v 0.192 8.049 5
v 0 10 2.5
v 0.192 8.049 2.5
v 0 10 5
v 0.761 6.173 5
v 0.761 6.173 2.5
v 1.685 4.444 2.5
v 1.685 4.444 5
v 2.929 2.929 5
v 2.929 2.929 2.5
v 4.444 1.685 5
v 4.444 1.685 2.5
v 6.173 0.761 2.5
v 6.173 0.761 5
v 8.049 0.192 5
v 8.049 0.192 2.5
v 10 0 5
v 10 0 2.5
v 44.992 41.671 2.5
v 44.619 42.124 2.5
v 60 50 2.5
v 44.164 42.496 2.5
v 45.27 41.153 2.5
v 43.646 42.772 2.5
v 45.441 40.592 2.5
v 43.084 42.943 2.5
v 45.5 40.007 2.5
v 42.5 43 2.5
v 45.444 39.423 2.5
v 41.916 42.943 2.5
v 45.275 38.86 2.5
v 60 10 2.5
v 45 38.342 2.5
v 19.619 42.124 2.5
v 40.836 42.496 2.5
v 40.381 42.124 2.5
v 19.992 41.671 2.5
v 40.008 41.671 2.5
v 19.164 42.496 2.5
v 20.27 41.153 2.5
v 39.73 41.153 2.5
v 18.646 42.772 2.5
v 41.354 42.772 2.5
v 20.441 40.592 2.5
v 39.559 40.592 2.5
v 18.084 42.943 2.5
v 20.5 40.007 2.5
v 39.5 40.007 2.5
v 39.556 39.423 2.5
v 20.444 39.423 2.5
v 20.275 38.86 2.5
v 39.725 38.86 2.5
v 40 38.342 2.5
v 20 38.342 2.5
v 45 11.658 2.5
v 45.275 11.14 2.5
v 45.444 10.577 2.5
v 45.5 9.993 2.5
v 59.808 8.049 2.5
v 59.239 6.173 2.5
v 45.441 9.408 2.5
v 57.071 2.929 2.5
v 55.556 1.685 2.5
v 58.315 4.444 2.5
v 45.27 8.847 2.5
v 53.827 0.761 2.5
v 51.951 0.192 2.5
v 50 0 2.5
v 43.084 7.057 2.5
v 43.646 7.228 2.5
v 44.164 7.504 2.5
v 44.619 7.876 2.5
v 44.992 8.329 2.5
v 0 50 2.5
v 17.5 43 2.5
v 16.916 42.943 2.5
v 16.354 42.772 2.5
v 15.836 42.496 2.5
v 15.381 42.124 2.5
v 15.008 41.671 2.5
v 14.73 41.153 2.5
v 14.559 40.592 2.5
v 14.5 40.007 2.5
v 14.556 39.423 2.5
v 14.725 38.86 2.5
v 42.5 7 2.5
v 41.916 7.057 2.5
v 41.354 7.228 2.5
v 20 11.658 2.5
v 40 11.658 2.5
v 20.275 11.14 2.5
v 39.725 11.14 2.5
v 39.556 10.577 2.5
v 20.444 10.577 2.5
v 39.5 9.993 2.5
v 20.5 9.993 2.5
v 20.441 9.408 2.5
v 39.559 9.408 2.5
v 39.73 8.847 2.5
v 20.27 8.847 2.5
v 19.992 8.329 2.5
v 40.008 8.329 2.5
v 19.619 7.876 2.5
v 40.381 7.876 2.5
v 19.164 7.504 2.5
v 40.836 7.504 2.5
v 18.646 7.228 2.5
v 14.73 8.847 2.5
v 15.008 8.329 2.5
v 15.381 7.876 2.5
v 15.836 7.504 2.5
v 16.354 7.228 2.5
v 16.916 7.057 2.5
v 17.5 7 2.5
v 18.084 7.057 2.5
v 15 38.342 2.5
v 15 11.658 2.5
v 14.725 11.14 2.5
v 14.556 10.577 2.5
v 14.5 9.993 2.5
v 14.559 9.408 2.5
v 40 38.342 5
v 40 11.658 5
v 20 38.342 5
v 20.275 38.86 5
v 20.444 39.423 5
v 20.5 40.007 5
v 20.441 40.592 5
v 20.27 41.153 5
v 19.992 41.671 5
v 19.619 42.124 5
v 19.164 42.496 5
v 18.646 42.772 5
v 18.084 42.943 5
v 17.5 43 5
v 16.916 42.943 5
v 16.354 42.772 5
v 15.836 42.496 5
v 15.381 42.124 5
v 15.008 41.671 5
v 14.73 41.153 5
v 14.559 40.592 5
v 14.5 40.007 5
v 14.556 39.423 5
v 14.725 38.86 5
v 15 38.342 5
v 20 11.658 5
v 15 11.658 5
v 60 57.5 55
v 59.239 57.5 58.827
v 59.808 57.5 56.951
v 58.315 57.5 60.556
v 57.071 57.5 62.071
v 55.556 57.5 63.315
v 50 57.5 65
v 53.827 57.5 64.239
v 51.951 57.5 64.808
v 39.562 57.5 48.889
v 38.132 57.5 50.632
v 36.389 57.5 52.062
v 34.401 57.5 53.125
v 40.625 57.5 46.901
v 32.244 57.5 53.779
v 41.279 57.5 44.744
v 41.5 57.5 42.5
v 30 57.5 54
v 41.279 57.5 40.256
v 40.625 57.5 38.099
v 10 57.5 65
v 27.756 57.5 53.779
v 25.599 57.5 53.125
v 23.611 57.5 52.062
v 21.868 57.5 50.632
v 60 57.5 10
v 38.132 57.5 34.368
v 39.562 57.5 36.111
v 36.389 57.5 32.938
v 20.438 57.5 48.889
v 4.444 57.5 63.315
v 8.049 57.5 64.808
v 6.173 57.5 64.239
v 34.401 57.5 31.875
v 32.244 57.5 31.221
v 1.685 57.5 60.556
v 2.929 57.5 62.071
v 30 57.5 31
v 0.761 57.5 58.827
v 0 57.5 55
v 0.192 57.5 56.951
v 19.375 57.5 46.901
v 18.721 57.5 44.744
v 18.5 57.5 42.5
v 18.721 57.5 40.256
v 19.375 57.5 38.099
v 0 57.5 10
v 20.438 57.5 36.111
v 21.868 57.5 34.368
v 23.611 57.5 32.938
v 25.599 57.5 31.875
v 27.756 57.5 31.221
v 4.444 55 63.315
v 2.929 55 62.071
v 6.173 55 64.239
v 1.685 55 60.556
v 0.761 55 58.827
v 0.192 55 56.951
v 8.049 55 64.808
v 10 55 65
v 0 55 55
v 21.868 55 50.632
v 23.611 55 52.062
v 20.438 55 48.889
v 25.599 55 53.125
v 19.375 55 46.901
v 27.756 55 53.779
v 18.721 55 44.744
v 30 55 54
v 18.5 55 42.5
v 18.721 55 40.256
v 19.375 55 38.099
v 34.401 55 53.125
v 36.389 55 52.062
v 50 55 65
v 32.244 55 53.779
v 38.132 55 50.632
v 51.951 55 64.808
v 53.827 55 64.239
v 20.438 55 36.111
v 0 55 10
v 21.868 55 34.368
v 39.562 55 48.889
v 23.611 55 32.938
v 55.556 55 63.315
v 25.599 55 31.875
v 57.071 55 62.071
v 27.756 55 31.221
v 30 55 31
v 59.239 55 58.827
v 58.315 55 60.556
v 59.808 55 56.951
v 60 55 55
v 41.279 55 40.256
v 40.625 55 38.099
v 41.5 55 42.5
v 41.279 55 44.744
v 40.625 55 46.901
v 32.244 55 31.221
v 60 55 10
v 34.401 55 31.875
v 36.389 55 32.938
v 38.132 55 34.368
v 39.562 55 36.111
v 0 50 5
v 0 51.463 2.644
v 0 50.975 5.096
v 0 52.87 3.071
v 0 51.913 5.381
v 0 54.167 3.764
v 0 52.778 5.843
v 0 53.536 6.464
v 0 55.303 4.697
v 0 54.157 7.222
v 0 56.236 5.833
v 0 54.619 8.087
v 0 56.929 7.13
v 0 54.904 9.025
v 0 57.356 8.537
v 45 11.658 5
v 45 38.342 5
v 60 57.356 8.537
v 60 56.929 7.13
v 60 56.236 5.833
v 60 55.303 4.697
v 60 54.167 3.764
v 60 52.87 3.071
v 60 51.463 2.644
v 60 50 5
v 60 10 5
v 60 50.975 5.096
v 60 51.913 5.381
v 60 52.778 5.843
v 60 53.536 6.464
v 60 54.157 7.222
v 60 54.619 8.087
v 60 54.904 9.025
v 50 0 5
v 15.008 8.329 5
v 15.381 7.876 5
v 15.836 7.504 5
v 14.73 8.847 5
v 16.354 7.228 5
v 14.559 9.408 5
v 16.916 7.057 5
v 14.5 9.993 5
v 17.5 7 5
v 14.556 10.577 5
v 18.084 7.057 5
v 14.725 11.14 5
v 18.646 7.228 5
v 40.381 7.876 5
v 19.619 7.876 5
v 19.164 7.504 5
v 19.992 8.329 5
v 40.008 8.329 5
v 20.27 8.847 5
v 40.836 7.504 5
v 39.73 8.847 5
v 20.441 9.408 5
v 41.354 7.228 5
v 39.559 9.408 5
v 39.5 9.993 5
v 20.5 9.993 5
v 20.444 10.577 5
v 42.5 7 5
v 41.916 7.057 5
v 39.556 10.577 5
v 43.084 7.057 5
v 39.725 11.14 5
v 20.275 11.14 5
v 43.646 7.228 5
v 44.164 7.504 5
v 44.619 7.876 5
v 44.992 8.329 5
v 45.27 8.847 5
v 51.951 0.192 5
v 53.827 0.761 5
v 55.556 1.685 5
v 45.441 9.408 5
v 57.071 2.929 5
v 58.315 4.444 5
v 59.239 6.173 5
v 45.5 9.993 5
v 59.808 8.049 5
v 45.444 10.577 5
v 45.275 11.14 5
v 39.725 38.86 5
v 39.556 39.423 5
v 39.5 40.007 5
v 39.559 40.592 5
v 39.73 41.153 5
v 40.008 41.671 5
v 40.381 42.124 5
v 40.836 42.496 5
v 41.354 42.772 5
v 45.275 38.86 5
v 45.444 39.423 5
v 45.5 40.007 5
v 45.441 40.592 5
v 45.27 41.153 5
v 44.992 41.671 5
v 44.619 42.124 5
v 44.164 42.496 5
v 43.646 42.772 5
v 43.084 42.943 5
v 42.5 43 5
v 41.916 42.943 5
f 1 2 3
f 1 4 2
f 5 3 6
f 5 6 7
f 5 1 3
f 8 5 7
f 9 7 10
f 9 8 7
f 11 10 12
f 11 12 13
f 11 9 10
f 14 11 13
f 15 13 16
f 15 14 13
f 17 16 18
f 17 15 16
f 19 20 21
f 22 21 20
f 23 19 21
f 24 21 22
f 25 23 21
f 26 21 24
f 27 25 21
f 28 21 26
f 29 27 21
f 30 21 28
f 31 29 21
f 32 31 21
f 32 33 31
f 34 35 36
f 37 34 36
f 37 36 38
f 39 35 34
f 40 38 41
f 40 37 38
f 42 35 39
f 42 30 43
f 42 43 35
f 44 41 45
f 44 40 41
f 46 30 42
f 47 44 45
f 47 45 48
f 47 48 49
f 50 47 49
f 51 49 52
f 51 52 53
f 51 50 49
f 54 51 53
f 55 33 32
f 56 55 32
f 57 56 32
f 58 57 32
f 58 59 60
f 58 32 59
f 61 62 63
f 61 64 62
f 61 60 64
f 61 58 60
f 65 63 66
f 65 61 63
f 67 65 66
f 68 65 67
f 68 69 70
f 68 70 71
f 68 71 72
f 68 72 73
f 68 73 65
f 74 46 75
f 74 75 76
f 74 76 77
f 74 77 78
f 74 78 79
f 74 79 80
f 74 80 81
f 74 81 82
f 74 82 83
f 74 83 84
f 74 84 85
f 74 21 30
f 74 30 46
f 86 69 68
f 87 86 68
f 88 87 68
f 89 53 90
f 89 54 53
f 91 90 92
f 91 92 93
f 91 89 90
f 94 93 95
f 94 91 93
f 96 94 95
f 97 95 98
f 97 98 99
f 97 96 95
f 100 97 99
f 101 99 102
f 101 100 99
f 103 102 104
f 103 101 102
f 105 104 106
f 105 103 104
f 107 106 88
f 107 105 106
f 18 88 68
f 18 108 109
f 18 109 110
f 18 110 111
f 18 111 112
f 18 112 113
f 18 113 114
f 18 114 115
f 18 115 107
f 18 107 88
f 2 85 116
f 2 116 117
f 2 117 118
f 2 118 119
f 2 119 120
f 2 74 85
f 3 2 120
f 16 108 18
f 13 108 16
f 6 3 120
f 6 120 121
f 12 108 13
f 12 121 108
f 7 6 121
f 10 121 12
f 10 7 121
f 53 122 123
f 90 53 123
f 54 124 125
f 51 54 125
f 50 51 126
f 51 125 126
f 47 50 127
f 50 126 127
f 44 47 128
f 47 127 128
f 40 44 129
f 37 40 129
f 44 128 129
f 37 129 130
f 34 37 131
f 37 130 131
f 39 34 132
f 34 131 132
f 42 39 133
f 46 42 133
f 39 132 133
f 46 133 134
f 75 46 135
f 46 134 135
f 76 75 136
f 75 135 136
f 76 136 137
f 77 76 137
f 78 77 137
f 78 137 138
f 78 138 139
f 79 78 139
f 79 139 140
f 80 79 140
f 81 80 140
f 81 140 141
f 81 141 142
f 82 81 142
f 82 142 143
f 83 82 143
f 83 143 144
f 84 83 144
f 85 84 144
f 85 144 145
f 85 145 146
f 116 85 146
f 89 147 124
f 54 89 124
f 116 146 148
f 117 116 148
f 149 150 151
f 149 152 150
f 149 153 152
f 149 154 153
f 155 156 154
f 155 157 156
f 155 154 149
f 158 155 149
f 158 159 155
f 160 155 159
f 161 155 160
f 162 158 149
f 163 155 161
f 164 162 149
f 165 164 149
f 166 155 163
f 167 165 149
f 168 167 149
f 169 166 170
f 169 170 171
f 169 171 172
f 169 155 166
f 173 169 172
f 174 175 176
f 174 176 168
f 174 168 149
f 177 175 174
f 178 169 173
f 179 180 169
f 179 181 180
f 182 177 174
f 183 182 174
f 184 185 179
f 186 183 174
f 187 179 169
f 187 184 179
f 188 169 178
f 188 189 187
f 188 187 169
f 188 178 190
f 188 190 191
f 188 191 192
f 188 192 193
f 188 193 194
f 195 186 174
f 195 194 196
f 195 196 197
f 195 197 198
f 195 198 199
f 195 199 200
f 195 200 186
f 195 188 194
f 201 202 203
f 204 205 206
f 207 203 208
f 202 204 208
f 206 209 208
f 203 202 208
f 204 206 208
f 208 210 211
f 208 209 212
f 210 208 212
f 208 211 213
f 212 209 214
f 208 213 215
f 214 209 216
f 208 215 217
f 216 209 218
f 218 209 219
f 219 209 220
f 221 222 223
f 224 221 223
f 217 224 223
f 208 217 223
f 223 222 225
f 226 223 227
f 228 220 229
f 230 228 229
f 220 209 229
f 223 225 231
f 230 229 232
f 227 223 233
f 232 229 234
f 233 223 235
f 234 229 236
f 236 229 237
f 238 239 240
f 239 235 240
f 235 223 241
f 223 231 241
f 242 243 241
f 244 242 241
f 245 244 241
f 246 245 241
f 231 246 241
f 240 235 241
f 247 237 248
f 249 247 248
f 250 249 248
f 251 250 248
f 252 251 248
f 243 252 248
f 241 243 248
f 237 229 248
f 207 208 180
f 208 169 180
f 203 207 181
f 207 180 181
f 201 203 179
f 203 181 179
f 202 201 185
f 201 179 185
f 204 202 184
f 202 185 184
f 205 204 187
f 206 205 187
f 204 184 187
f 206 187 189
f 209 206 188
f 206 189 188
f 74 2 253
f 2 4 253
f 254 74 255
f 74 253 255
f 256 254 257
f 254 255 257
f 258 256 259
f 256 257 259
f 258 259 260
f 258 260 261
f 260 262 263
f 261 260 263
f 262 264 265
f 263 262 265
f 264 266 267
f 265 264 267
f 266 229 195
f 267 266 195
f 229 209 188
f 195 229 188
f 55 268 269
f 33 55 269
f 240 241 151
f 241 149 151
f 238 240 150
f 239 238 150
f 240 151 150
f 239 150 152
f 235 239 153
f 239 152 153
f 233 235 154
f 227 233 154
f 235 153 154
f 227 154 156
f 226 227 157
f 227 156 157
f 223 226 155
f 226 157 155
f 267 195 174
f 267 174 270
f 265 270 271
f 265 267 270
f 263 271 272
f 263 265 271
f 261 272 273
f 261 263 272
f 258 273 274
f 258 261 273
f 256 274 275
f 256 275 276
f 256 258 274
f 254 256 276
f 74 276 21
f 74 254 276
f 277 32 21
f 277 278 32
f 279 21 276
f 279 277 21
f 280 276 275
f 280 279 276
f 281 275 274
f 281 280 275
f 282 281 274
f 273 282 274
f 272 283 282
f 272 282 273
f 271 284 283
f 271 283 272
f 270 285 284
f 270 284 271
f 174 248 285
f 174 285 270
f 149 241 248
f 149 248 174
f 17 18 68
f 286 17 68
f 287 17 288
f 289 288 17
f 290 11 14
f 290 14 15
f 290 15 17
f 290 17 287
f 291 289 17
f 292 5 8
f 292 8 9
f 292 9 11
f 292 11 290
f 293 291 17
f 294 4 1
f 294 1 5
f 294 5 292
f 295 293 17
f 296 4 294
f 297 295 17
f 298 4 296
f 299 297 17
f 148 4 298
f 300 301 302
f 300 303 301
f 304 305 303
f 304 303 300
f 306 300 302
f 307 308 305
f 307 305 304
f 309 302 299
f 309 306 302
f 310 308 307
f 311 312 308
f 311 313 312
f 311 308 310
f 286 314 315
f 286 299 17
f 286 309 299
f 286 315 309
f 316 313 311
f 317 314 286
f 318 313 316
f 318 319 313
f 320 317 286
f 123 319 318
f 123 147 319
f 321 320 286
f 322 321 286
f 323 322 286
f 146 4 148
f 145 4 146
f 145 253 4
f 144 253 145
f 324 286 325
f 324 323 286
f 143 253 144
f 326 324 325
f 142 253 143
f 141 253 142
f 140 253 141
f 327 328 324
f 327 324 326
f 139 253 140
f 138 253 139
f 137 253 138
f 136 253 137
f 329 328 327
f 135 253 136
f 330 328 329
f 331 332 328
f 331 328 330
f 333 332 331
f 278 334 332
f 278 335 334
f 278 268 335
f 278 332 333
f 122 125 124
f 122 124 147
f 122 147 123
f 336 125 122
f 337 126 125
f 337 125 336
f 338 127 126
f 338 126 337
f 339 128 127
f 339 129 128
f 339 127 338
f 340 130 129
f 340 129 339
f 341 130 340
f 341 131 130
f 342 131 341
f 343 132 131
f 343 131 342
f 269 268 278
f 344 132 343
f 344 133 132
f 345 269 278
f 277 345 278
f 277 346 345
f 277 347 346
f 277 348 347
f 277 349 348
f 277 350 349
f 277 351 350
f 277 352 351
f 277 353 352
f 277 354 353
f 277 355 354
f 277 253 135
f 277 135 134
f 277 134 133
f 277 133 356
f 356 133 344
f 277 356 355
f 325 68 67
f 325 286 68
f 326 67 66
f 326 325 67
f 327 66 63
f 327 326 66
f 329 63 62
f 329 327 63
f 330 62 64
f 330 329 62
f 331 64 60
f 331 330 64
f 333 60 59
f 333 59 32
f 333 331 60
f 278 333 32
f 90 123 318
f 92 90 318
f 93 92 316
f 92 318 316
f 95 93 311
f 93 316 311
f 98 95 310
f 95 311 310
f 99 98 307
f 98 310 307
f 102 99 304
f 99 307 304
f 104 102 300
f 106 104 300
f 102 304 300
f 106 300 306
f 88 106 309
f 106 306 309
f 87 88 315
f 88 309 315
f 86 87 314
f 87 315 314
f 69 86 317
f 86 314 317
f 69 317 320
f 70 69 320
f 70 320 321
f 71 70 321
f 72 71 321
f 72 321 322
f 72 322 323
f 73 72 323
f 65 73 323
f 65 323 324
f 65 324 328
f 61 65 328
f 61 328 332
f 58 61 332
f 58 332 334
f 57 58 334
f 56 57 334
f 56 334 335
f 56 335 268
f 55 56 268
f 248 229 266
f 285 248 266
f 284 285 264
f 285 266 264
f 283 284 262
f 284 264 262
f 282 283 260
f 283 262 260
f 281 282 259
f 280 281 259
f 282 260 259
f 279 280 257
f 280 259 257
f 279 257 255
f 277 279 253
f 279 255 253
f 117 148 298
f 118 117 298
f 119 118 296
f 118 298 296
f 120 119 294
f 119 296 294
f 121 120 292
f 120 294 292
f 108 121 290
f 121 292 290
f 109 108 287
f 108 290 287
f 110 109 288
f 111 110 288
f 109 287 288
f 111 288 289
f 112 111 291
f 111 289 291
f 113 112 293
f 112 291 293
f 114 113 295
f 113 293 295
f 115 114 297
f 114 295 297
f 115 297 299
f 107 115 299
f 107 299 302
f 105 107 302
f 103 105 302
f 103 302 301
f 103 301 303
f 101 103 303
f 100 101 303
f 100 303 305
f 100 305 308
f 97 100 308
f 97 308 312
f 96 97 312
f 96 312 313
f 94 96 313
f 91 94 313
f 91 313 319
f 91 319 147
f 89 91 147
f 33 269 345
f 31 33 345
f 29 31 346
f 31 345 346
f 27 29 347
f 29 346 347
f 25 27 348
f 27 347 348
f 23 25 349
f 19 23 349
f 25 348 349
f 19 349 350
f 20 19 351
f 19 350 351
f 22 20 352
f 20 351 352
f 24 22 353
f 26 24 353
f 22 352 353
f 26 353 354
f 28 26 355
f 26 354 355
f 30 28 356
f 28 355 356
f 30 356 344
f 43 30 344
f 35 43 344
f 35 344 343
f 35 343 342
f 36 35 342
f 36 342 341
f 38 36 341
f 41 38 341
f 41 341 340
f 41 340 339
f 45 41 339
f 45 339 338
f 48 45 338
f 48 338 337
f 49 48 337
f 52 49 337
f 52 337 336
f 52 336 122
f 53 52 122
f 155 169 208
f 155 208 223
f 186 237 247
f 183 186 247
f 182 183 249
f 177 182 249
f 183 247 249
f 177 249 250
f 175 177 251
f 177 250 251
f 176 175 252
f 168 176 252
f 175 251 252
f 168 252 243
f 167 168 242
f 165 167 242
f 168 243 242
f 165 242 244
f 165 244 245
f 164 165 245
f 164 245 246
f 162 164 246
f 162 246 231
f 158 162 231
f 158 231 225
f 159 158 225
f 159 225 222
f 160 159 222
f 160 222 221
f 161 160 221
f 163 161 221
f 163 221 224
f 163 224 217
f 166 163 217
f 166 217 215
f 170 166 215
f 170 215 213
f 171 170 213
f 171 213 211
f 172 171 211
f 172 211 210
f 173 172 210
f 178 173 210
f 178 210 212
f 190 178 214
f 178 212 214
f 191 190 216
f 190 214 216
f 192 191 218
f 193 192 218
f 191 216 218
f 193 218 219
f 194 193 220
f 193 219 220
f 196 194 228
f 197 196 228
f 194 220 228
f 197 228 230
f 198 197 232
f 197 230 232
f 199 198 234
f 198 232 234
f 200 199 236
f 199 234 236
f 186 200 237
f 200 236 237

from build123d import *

# Parameters (mm, degrees)
SKETCH2_W              = 60
SKETCH2_H              = 60
BOSS_EXTRUDE1_DEPTH    = 5
SKETCH3_W              = 60
SKETCH3_H              = 5
BOSS_EXTRUDE2_DEPTH    = 60
CUT_EXTRUDE1_REACH     = 106.163
SKETCH4_R              = 11.5
CUT_EXTRUDE2_REACH     = 105.923
CONVERT_SOLID1_DEPTH   = 60
CONVERT_SOLID1_2_DEPTH = 60
FILLET1_R              = 10
FILLET2_R              = 10
FILLET3_R              = 10
FILLET4_R              = 10


# Read off the part's stored shape, not the designer's step: Convert-Solid1
with BuildPart() as part:
    # Sketch2 → Boss-Extrude1 (new body)
    with BuildSketch(Plane.XY):
        with Locations((30, 30)):
            Rectangle(SKETCH2_W, SKETCH2_H)
    extrude(amount=BOSS_EXTRUDE1_DEPTH)

    # Sketch3 → Boss-Extrude2 (add)
    with BuildSketch(Plane.XY.offset(5)):
        with Locations((30, 57.5)):
            Rectangle(SKETCH3_W, SKETCH3_H)
    extrude(amount=BOSS_EXTRUDE2_DEPTH)

    # Sketch4 → Cut-Extrude1 (cut, up to next)
    with BuildSketch(Plane.XZ.offset(-55), mode=Mode.PRIVATE) as cut_extrude1_sk1:
        with Locations(Location((30, 42.5, 0), (0, 0, 270))):
            Circle(SKETCH4_R)
    cut_extrude1_tool1 = extrude(cut_extrude1_sk1.sketch, amount=-CUT_EXTRUDE1_REACH, mode=Mode.PRIVATE) & part.part
    add(cut_extrude1_tool1.solids().sort_by_distance((30, 55, 42.5))[0], mode=Mode.SUBTRACT)

    # Sketch5 → Cut-Extrude2 (cut, up to next)
    with BuildSketch(Plane.XY.offset(5), mode=Mode.PRIVATE) as cut_extrude2_sk1:
        with BuildLine():
            Line((15, 38.341687605), (15, 11.658312395))
            ThreePointArc((15, 11.658312395), (17.5, 7), (20, 11.658312395))
            Line((20, 11.658312395), (20, 38.341687605))
            ThreePointArc((20, 38.341687605), (17.5, 43), (15, 38.341687605))
        make_face()
    cut_extrude2_tool1 = extrude(cut_extrude2_sk1.sketch, amount=-CUT_EXTRUDE2_REACH, mode=Mode.PRIVATE) & part.part
    # Sketch5 → Cut-Extrude2 (cut, up to next)
    with BuildSketch(Plane.XY.offset(5), mode=Mode.PRIVATE) as cut_extrude2_sk2:
        with BuildLine():
            Line((40, 38.341687605), (40, 11.658312395))
            ThreePointArc((40, 11.658312395), (42.5, 7), (45, 11.658312395))
            Line((45, 11.658312395), (45, 38.341687605))
            ThreePointArc((45, 38.341687605), (42.5, 43), (40, 38.341687605))
        make_face()
    cut_extrude2_tool2 = extrude(cut_extrude2_sk2.sketch, amount=-CUT_EXTRUDE2_REACH, mode=Mode.PRIVATE) & part.part
    add(cut_extrude2_tool1.solids().sort_by_distance((17.5, 25, 5))[0], mode=Mode.SUBTRACT)
    add(cut_extrude2_tool2.solids().sort_by_distance((42.5, 25, 5))[0], mode=Mode.SUBTRACT)

    # Convert-Solid1 outline → Convert-Solid1 (cut)
    with BuildSketch(Plane.YZ):
        with BuildLine():
            Line((60, 65), (57.5, 65))
            Line((57.5, 65), (57.5, 10))
            ThreePointArc((57.5, 10), (55.303300859, 4.696699141), (50, 2.5))
            Line((50, 2.5), (0, 2.5))
            Line((0, 2.5), (0, 0))
            Line((0, 0), (60, 0))
            Line((60, 0), (60, 65))
        make_face()
    extrude(amount=CONVERT_SOLID1_DEPTH, mode=Mode.SUBTRACT)

    # Convert-Solid1 2 outline → Convert-Solid1 2 (add)
    with BuildSketch(Plane.YZ):
        with BuildLine():
            Line((55, 5), (55, 10))
            ThreePointArc((55, 10), (53.535533906, 6.464466094), (50, 5))
            Line((50, 5), (55, 5))
        make_face()
    extrude(amount=CONVERT_SOLID1_2_DEPTH)

    # Fillet1
    fillet1_edges = [part.edges().sort_by_distance(p)[0] for p in [
        (60, 56.25, 65),
    ]]
    fillet(fillet1_edges, radius=FILLET1_R)

    # Fillet2
    fillet2_edges = [part.edges().sort_by_distance(p)[0] for p in [
        (0, 56.25, 65),
    ]]
    fillet(fillet2_edges, radius=FILLET2_R)

    # Fillet3
    fillet3_edges = [part.edges().sort_by_distance(p)[0] for p in [
        (0, 0, 3.75),
    ]]
    fillet(fillet3_edges, radius=FILLET3_R)

    # Fillet4
    fillet4_edges = [part.edges().sort_by_distance(p)[0] for p in [
        (60, 0, 3.75),
    ]]
    fillet(fillet4_edges, radius=FILLET4_R)


solid = part.part
